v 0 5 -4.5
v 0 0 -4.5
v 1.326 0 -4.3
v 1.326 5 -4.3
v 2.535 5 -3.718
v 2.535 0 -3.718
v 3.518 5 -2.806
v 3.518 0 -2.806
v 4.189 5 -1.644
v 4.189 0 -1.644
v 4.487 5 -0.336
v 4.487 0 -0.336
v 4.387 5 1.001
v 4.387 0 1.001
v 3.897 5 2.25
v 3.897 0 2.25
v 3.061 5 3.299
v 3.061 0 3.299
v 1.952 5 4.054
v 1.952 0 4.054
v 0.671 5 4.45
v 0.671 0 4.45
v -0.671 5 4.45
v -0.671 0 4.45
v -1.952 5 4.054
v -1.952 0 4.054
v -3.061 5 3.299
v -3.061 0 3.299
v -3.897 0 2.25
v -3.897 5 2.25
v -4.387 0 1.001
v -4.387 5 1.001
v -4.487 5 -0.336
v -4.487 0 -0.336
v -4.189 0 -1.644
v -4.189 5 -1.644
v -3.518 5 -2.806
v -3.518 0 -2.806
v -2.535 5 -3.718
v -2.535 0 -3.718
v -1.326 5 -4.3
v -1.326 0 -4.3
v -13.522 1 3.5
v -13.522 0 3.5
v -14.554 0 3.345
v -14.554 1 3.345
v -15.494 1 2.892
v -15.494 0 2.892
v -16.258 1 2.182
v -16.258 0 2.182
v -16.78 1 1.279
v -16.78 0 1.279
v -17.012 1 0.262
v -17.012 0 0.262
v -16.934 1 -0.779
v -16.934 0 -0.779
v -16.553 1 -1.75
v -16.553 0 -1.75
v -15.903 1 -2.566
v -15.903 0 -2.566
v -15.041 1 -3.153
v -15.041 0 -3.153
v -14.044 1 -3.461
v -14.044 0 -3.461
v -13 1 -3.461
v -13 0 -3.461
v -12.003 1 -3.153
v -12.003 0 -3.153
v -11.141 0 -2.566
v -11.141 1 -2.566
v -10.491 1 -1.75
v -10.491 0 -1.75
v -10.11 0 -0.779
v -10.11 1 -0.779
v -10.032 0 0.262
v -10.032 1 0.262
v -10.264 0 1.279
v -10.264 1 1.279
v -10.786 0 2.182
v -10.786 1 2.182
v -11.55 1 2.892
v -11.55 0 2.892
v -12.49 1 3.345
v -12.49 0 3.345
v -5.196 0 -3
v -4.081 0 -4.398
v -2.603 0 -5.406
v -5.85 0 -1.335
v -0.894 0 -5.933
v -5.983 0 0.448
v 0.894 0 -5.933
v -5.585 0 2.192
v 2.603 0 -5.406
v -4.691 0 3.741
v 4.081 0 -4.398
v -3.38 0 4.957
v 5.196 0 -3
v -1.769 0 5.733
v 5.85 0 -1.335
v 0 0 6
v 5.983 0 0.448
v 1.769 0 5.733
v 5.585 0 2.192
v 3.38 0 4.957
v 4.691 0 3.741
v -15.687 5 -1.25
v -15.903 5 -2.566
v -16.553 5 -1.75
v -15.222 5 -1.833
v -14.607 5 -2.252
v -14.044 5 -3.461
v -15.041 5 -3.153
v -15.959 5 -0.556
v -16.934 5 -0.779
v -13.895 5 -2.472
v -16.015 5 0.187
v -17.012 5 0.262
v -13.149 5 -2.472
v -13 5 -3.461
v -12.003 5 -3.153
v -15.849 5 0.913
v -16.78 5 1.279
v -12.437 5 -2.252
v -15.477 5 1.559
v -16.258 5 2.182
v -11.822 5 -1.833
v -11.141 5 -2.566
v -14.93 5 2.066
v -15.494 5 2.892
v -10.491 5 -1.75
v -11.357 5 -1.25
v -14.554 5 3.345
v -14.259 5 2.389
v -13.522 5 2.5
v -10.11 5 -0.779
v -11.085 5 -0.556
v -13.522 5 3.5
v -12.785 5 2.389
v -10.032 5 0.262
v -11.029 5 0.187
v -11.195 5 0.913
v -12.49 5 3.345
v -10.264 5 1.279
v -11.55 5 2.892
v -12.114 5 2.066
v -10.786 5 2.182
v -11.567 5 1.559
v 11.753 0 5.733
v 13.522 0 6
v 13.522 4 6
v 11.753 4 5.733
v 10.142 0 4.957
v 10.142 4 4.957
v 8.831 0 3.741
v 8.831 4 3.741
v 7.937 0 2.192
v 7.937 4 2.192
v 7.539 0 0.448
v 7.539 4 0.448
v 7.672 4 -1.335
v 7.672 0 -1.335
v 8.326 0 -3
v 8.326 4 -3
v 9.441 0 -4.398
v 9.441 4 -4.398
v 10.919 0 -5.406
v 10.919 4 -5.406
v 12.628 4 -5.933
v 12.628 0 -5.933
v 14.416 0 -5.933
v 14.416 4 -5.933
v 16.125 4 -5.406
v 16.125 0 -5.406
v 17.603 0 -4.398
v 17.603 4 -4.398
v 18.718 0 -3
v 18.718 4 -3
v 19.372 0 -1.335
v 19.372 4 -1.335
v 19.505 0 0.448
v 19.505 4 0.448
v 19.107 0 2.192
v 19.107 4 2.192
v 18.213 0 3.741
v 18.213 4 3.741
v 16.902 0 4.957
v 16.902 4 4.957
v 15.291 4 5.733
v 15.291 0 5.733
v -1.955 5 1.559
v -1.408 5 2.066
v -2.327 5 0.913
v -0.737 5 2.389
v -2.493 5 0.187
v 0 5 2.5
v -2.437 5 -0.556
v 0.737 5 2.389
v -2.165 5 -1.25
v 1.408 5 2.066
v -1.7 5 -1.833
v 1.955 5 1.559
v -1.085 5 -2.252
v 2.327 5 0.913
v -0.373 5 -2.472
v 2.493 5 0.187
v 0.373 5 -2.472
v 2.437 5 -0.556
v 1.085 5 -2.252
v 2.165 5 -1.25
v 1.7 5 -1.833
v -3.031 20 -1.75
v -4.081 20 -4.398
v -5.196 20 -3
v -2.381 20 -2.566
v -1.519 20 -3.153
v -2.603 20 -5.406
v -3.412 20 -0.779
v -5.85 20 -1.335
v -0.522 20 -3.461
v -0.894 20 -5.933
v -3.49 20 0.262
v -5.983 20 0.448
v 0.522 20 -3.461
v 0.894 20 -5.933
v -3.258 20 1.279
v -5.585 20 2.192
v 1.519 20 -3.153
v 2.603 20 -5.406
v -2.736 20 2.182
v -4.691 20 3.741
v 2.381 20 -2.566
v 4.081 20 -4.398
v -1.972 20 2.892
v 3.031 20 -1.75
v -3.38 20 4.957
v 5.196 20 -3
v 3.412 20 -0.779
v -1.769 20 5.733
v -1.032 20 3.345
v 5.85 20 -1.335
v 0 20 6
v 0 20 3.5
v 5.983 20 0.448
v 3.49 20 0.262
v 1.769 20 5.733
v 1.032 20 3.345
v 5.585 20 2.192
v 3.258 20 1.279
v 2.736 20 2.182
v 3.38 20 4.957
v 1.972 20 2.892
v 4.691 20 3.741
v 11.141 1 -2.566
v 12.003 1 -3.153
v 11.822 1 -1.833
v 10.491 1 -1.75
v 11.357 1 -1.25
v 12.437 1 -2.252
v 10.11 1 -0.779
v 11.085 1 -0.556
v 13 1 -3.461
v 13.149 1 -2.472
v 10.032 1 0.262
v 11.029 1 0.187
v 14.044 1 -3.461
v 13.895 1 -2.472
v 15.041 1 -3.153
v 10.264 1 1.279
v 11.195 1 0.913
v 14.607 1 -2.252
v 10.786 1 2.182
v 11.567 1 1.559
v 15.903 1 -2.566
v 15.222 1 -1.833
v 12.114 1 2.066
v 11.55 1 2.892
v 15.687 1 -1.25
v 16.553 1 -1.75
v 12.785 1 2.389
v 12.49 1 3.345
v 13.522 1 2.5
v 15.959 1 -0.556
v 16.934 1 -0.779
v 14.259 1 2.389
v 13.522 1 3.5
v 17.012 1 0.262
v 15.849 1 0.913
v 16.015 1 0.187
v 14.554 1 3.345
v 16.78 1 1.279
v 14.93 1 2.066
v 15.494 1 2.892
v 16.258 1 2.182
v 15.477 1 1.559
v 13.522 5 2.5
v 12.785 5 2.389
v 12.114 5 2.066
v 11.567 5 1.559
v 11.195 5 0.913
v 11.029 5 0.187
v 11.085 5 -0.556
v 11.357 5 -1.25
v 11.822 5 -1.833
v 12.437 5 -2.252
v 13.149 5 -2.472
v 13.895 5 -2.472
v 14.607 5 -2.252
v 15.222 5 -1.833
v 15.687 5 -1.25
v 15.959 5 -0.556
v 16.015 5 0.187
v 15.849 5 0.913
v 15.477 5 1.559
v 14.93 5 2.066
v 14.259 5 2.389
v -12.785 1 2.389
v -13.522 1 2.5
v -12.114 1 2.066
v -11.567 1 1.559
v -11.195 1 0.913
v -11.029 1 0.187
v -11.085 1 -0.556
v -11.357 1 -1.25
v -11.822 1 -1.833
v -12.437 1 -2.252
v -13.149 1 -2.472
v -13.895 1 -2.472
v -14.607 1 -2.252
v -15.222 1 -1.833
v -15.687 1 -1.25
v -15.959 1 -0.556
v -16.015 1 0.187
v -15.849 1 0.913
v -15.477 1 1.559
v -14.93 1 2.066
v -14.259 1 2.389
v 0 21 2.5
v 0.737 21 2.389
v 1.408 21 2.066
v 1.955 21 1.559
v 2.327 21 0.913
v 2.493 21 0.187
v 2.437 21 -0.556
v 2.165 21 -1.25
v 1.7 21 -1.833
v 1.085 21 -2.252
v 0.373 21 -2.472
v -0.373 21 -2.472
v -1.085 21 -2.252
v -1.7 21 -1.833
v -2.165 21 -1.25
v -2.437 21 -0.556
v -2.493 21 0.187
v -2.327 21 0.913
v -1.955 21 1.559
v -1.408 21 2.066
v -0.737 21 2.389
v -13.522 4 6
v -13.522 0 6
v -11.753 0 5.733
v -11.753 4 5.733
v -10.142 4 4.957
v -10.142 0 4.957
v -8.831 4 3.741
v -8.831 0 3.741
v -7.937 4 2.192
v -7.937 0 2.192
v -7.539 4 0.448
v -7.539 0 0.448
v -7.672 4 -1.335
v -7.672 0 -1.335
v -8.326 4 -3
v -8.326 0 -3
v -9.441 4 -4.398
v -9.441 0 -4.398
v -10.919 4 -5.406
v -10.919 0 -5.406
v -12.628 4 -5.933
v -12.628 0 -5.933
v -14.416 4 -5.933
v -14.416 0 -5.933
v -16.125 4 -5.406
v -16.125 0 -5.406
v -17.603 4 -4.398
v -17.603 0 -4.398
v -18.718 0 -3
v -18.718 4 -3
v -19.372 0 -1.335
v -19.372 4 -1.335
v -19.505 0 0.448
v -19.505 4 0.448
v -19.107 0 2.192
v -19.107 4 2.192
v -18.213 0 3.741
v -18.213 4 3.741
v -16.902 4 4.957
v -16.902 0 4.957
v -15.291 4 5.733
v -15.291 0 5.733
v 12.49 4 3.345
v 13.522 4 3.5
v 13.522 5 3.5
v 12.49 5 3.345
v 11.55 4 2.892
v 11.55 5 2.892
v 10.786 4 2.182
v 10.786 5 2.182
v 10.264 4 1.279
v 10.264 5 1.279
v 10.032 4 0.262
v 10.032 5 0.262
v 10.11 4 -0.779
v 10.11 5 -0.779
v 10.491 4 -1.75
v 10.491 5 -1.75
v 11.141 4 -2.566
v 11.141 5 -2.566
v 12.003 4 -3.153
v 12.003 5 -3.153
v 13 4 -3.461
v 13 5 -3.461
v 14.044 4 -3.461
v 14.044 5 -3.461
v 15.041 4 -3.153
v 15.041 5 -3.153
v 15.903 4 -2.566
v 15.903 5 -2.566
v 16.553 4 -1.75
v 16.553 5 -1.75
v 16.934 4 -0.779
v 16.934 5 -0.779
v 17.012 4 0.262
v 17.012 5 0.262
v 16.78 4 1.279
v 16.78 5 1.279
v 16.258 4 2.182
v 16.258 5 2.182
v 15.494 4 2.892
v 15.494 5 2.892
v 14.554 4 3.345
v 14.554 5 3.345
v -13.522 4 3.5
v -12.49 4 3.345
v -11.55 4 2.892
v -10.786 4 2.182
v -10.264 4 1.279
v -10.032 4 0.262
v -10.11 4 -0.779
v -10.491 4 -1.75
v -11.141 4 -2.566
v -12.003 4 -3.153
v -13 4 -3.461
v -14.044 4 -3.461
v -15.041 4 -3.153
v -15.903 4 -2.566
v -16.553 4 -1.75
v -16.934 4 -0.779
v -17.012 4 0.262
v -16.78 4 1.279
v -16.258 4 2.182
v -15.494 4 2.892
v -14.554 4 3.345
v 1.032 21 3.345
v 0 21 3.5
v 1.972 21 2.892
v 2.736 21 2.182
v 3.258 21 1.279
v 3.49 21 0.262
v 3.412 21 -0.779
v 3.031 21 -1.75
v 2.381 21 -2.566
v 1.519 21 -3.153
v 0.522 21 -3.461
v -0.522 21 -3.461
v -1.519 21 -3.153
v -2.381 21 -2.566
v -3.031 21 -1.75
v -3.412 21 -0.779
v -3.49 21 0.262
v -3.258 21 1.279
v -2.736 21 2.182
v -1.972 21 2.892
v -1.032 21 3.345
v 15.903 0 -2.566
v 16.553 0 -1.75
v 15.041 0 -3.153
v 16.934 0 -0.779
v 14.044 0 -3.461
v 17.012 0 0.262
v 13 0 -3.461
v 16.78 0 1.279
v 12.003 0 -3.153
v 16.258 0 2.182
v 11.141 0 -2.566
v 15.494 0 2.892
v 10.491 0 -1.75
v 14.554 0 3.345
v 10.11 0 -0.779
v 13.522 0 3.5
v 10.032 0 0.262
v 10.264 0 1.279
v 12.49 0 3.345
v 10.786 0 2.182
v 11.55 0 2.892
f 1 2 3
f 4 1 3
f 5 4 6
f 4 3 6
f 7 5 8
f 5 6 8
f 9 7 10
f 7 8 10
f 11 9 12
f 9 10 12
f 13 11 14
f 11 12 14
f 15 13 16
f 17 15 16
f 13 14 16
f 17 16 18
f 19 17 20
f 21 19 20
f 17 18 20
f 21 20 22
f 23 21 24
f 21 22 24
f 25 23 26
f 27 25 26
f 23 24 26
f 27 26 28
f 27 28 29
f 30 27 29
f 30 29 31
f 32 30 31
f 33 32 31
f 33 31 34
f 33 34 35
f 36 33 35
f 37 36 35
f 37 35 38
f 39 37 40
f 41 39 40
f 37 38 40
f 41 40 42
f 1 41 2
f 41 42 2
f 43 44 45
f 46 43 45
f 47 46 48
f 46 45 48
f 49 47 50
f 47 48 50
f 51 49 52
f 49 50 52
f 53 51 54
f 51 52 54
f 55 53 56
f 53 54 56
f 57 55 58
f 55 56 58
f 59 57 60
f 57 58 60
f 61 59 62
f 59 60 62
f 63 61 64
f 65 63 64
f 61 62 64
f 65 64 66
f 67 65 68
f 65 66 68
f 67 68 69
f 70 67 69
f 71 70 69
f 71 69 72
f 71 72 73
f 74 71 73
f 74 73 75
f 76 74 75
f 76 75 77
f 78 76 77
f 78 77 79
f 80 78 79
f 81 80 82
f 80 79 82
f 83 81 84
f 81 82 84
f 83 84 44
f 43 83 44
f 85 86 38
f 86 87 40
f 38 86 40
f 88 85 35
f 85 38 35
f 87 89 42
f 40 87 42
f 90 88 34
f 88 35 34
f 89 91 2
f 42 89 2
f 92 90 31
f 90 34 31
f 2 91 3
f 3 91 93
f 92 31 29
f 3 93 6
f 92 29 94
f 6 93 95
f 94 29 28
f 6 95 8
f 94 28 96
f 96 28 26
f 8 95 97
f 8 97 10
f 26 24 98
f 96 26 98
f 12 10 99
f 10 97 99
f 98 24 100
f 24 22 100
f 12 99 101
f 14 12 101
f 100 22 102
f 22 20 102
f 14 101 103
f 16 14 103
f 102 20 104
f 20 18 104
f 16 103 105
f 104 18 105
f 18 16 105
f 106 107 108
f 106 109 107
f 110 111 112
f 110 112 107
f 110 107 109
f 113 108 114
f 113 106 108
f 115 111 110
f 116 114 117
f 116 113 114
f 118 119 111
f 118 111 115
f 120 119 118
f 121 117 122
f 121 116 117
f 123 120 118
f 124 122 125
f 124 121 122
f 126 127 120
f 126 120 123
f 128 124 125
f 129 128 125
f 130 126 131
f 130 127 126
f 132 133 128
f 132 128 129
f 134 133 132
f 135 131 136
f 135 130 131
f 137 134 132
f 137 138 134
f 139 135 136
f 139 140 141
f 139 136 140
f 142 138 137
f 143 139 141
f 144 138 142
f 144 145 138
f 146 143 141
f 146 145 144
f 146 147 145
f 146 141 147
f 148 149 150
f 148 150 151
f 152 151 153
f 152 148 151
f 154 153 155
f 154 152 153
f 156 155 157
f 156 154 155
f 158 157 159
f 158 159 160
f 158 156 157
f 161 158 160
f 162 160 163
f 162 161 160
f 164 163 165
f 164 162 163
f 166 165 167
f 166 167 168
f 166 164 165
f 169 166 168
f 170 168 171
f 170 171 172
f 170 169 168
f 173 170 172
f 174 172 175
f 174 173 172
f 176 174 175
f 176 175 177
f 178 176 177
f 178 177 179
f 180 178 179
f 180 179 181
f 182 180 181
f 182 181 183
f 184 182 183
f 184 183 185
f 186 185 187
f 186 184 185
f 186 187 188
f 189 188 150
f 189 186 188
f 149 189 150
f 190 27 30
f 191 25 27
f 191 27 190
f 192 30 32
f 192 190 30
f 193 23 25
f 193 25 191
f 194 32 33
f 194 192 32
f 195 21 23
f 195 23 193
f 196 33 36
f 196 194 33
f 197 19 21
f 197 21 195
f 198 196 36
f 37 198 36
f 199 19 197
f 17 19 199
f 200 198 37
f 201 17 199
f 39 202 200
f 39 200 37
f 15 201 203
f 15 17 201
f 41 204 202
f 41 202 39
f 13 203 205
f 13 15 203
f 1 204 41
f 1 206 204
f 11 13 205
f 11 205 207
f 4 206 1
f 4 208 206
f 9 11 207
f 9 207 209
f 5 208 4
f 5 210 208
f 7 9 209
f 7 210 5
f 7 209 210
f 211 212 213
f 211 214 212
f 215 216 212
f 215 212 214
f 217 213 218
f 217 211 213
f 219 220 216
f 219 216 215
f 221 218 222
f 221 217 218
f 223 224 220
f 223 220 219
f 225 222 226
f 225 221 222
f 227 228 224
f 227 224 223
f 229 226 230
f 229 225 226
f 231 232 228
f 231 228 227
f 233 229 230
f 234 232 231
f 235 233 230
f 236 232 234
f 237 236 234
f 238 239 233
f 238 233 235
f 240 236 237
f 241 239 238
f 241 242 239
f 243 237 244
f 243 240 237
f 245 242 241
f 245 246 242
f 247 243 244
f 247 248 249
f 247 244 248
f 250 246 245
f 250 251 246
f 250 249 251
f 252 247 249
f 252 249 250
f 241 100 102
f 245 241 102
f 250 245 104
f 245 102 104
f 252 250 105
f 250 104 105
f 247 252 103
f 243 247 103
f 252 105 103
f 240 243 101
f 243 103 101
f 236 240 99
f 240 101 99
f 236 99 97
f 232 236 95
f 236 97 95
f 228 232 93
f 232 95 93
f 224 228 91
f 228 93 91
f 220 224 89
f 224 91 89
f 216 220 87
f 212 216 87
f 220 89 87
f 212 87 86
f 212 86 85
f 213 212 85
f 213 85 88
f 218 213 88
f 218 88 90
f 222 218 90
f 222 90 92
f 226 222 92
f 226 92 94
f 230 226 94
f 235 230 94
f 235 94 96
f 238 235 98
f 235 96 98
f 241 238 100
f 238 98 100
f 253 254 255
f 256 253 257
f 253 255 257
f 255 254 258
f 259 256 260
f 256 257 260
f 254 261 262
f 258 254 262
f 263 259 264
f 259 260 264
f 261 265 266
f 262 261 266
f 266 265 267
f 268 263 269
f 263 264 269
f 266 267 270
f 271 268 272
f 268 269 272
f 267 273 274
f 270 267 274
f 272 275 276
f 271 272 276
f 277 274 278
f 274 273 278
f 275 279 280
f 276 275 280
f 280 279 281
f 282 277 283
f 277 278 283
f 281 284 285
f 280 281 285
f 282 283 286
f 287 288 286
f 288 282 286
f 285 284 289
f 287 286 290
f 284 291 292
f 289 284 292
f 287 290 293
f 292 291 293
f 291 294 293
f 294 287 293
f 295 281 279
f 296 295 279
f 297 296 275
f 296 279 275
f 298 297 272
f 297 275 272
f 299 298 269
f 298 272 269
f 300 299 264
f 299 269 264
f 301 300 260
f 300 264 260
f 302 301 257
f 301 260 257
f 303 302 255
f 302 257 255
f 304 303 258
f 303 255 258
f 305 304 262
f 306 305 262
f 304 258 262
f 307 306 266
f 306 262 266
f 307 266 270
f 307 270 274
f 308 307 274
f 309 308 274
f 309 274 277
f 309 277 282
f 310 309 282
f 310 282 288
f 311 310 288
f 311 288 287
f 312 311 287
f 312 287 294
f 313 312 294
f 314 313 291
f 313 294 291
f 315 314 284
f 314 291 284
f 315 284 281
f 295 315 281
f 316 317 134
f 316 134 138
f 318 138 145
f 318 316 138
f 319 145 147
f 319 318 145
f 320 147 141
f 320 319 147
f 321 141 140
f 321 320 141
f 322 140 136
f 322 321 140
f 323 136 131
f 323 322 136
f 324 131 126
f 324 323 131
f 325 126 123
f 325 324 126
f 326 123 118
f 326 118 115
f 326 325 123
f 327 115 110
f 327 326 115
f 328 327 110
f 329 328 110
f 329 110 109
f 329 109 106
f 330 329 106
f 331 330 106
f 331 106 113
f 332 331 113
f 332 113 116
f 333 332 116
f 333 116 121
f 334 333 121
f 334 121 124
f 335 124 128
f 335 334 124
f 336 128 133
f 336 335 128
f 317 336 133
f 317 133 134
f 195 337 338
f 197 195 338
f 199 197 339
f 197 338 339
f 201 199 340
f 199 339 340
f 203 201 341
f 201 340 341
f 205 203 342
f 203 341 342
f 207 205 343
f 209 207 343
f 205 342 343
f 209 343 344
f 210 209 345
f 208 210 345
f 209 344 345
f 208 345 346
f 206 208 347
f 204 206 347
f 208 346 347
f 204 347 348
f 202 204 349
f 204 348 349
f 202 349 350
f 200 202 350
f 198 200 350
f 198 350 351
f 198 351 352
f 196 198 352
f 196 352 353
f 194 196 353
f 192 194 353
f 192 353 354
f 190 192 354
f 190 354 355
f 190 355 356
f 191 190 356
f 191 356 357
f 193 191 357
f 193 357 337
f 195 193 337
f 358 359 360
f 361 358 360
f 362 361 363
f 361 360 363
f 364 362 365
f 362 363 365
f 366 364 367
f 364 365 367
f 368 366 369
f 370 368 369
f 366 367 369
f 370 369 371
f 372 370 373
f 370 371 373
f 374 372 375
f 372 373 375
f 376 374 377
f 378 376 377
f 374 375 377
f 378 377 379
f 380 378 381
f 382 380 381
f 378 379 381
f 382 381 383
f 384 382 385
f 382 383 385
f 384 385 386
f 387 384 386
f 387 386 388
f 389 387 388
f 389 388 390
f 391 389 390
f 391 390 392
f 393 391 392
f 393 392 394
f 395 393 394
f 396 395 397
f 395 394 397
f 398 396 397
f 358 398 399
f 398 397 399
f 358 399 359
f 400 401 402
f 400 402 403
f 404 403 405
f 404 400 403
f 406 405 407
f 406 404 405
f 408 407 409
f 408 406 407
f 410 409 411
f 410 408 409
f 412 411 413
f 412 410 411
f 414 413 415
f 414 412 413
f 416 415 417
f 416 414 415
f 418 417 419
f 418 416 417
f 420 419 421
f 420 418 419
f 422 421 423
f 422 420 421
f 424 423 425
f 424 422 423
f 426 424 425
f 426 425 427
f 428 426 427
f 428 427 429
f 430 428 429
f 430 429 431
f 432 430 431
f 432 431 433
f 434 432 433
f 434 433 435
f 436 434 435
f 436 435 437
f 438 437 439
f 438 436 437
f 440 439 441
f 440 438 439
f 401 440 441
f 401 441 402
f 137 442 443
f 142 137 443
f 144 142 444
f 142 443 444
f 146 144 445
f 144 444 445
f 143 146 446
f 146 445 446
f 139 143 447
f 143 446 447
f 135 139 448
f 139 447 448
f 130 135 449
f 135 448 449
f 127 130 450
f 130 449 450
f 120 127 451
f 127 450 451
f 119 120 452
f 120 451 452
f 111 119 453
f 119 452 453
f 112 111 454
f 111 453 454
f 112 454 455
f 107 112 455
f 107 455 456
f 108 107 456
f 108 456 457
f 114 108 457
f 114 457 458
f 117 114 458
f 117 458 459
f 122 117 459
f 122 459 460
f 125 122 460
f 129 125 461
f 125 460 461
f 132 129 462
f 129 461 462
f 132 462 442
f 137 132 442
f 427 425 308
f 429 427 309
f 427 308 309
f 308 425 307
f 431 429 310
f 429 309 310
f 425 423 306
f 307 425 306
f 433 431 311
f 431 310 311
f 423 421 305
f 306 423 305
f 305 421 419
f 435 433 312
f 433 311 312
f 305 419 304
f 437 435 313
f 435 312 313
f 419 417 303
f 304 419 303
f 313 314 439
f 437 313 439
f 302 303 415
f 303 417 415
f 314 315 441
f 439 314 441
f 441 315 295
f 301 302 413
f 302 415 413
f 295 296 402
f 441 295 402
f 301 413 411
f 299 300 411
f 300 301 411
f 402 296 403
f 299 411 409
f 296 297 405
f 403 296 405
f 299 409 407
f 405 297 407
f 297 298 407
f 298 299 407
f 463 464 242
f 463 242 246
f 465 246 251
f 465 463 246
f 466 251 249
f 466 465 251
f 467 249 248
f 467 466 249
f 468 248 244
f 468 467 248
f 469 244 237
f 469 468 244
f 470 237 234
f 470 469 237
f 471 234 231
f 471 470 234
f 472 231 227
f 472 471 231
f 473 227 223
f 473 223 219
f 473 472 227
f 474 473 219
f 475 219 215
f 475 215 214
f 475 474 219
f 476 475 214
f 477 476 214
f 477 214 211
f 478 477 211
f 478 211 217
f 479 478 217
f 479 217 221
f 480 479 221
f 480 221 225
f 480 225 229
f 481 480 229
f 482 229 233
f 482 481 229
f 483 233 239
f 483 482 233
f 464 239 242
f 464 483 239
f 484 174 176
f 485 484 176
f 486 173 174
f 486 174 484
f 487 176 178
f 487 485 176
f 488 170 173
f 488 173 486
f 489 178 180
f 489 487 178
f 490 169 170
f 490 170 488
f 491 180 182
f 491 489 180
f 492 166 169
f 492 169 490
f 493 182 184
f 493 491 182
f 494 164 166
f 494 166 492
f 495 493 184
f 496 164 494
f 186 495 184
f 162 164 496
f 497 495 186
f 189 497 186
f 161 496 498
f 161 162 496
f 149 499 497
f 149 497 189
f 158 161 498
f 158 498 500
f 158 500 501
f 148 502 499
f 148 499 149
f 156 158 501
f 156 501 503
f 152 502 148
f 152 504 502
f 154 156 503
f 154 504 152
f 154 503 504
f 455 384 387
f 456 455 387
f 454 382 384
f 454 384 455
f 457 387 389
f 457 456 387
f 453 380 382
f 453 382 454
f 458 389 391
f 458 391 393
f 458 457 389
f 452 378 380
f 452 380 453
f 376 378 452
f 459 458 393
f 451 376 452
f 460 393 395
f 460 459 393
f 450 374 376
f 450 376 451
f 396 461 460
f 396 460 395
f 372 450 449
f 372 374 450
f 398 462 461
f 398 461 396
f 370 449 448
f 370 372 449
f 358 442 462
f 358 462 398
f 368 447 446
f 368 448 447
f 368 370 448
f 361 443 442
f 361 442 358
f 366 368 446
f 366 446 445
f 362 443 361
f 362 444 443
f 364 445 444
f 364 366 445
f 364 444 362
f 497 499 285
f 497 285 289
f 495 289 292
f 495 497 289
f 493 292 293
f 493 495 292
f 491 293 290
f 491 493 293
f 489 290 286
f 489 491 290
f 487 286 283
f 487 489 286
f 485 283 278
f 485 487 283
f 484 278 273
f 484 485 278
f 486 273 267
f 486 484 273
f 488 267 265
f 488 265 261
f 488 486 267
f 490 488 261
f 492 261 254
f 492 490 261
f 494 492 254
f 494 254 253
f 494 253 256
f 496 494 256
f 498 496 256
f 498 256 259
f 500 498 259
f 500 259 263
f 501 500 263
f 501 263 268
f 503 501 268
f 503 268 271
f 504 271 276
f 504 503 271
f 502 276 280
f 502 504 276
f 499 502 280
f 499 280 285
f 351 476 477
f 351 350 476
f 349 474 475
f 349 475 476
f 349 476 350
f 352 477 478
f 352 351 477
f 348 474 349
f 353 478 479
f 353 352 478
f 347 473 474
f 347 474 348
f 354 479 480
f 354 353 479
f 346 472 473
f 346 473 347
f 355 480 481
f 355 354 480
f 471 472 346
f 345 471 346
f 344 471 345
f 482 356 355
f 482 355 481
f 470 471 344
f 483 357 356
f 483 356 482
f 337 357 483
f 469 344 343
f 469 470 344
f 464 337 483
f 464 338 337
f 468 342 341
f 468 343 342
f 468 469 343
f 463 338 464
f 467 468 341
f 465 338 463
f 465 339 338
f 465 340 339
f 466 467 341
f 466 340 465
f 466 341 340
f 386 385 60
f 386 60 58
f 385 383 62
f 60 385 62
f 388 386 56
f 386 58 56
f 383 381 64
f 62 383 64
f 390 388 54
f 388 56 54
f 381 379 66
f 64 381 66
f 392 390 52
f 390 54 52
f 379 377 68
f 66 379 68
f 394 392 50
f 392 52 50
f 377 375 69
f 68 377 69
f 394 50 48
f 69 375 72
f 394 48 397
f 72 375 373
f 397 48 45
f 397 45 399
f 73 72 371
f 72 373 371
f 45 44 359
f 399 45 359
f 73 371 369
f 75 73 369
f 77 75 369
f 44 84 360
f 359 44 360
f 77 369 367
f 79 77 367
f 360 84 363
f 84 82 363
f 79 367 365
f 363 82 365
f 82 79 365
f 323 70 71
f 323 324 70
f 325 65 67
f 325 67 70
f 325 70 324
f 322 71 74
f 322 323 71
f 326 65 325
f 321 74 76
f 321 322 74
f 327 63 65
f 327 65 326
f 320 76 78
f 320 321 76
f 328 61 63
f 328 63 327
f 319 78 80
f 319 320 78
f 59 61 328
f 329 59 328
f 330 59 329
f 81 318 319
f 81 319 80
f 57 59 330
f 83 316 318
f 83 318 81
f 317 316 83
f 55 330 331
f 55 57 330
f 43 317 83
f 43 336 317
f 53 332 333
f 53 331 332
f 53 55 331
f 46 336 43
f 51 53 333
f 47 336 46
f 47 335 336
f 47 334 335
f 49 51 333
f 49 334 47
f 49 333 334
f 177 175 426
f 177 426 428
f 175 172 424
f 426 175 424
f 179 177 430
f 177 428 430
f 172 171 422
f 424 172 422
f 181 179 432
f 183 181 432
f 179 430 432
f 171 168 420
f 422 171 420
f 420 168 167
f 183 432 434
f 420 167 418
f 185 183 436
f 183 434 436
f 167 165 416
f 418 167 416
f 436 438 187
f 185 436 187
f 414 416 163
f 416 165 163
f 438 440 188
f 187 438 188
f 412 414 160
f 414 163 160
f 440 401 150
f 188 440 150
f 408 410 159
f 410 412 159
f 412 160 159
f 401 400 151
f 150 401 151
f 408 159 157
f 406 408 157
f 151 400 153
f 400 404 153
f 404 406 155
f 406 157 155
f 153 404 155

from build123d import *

# Parameters (mm, degrees)
CROQUIS1_R              = 6
SALIENTE_EXTRUIR1_DEPTH = 20
CROQUIS2_R              = 2.5
CORTAR_EXTRUIR1_DEPTH   = 20
SALIENTE_EXTRUIR2_START = 1
CROQUIS3_R              = 3.5
CROQUIS3_R_2            = 2.5
SALIENTE_EXTRUIR2_DEPTH = 1
CROQUIS4_R              = 4.5
CORTAR_EXTRUIR2_DEPTH   = 5
CROQUIS5_R              = 6
SALIENTE_EXTRUIR3_DEPTH = 4
CROQUIS6_R              = 2.5
CORTAR_EXTRUIR3_DEPTH   = 4
CROQUIS7_R              = 3.5
CROQUIS7_R_2            = 2.5
SALIENTE_EXTRUIR4_DEPTH = 1
CROQUIS8_R              = 3.5
CROQUIS8_R_2            = 2.5
CORTAR_EXTRUIR4_DEPTH   = 1


with BuildPart() as part:
    # Croquis1 → Saliente-Extruir1 (new body)
    with BuildSketch(Plane(origin=(0, 0, 0), x_dir=(1, 0, 0), z_dir=(0, 1, 0))):
        with Locations(Location((0, 0, 0), (0, 0, 270))):
            Circle(CROQUIS1_R)
    extrude(amount=SALIENTE_EXTRUIR1_DEPTH)

    # Croquis2 → Cortar-Extruir1 (cut)
    with BuildSketch(Plane(origin=(0, 20, 0), x_dir=(1, 0, 0), z_dir=(0, 1, 0))):
        with Locations(Location((0, 0, 0), (0, 0, 270))):
            Circle(CROQUIS2_R)
    extrude(amount=-CORTAR_EXTRUIR1_DEPTH, mode=Mode.SUBTRACT)

    # Croquis3 → Saliente-Extruir2 (add)
    with BuildSketch(Plane(origin=(0, 20, 0), x_dir=(1, 0, 0), z_dir=(0, 1, 0)).offset(SALIENTE_EXTRUIR2_START)):
        with Locations(Location((0, 0, 0), (0, 0, 270))):
            Circle(CROQUIS3_R)
        with Locations(Location((0, 0, 0), (0, 0, 270))):
            Circle(CROQUIS3_R_2, mode=Mode.SUBTRACT)
    extrude(amount=-SALIENTE_EXTRUIR2_DEPTH)

    # Croquis4 → Cortar-Extruir2 (cut)
    with BuildSketch(Plane.XZ):
        with Locations(Location((0, 0, 0), (0, 0, 270))):
            Circle(CROQUIS4_R)
    extrude(amount=-CORTAR_EXTRUIR2_DEPTH, mode=Mode.SUBTRACT)


with BuildPart() as body_2:
    # Croquis5 → Saliente-Extruir3 (new body)
    with BuildSketch(Plane(origin=(0, 0, 0), x_dir=(1, 0, 0), z_dir=(0, 1, 0))):
        with Locations(Location((-13.521991575, 0, 0), (0, 0, 270))):
            Circle(CROQUIS5_R)
    extrude(amount=SALIENTE_EXTRUIR3_DEPTH)

    # Croquis6 → Cortar-Extruir3 (cut)
    with BuildSketch(Plane(origin=(0, 4, 0), x_dir=(1, 0, 0), z_dir=(0, 1, 0))):
        with Locations(Location((-13.521991575, 0, 0), (0, 0, 270))):
            Circle(CROQUIS6_R)
    extrude(amount=-CORTAR_EXTRUIR3_DEPTH, mode=Mode.SUBTRACT)

    # Croquis7 → Saliente-Extruir4 (add)
    with BuildSketch(Plane(origin=(0, 4, 0), x_dir=(1, 0, 0), z_dir=(0, 1, 0))):
        with Locations(Location((-13.521991575, 0, 0), (0, 0, 270))):
            Circle(CROQUIS7_R)
        with Locations(Location((-13.521991575, 0, 0), (0, 0, 270))):
            Circle(CROQUIS7_R_2, mode=Mode.SUBTRACT)
    extrude(amount=SALIENTE_EXTRUIR4_DEPTH)

    # Croquis8 → Cortar-Extruir4 (cut)
    with BuildSketch(Plane.XZ):
        with Locations(Location((-13.521991575, 0, 0), (0, 0, 90))):
            Circle(CROQUIS8_R)
        with Locations(Location((-13.521991575, 0, 0), (0, 0, 90))):
            Circle(CROQUIS8_R_2, mode=Mode.SUBTRACT)
    extrude(amount=-CORTAR_EXTRUIR4_DEPTH, mode=Mode.SUBTRACT)


with BuildPart() as body_3:
    # Simetría2: mirrored copy
    add(body_2.part.mirror(Plane(origin=(0, 0, 0), x_dir=(0, 0, 1), z_dir=(1, 0, 0))))


solid = Compound([part.part, body_2.part, body_3.part])
